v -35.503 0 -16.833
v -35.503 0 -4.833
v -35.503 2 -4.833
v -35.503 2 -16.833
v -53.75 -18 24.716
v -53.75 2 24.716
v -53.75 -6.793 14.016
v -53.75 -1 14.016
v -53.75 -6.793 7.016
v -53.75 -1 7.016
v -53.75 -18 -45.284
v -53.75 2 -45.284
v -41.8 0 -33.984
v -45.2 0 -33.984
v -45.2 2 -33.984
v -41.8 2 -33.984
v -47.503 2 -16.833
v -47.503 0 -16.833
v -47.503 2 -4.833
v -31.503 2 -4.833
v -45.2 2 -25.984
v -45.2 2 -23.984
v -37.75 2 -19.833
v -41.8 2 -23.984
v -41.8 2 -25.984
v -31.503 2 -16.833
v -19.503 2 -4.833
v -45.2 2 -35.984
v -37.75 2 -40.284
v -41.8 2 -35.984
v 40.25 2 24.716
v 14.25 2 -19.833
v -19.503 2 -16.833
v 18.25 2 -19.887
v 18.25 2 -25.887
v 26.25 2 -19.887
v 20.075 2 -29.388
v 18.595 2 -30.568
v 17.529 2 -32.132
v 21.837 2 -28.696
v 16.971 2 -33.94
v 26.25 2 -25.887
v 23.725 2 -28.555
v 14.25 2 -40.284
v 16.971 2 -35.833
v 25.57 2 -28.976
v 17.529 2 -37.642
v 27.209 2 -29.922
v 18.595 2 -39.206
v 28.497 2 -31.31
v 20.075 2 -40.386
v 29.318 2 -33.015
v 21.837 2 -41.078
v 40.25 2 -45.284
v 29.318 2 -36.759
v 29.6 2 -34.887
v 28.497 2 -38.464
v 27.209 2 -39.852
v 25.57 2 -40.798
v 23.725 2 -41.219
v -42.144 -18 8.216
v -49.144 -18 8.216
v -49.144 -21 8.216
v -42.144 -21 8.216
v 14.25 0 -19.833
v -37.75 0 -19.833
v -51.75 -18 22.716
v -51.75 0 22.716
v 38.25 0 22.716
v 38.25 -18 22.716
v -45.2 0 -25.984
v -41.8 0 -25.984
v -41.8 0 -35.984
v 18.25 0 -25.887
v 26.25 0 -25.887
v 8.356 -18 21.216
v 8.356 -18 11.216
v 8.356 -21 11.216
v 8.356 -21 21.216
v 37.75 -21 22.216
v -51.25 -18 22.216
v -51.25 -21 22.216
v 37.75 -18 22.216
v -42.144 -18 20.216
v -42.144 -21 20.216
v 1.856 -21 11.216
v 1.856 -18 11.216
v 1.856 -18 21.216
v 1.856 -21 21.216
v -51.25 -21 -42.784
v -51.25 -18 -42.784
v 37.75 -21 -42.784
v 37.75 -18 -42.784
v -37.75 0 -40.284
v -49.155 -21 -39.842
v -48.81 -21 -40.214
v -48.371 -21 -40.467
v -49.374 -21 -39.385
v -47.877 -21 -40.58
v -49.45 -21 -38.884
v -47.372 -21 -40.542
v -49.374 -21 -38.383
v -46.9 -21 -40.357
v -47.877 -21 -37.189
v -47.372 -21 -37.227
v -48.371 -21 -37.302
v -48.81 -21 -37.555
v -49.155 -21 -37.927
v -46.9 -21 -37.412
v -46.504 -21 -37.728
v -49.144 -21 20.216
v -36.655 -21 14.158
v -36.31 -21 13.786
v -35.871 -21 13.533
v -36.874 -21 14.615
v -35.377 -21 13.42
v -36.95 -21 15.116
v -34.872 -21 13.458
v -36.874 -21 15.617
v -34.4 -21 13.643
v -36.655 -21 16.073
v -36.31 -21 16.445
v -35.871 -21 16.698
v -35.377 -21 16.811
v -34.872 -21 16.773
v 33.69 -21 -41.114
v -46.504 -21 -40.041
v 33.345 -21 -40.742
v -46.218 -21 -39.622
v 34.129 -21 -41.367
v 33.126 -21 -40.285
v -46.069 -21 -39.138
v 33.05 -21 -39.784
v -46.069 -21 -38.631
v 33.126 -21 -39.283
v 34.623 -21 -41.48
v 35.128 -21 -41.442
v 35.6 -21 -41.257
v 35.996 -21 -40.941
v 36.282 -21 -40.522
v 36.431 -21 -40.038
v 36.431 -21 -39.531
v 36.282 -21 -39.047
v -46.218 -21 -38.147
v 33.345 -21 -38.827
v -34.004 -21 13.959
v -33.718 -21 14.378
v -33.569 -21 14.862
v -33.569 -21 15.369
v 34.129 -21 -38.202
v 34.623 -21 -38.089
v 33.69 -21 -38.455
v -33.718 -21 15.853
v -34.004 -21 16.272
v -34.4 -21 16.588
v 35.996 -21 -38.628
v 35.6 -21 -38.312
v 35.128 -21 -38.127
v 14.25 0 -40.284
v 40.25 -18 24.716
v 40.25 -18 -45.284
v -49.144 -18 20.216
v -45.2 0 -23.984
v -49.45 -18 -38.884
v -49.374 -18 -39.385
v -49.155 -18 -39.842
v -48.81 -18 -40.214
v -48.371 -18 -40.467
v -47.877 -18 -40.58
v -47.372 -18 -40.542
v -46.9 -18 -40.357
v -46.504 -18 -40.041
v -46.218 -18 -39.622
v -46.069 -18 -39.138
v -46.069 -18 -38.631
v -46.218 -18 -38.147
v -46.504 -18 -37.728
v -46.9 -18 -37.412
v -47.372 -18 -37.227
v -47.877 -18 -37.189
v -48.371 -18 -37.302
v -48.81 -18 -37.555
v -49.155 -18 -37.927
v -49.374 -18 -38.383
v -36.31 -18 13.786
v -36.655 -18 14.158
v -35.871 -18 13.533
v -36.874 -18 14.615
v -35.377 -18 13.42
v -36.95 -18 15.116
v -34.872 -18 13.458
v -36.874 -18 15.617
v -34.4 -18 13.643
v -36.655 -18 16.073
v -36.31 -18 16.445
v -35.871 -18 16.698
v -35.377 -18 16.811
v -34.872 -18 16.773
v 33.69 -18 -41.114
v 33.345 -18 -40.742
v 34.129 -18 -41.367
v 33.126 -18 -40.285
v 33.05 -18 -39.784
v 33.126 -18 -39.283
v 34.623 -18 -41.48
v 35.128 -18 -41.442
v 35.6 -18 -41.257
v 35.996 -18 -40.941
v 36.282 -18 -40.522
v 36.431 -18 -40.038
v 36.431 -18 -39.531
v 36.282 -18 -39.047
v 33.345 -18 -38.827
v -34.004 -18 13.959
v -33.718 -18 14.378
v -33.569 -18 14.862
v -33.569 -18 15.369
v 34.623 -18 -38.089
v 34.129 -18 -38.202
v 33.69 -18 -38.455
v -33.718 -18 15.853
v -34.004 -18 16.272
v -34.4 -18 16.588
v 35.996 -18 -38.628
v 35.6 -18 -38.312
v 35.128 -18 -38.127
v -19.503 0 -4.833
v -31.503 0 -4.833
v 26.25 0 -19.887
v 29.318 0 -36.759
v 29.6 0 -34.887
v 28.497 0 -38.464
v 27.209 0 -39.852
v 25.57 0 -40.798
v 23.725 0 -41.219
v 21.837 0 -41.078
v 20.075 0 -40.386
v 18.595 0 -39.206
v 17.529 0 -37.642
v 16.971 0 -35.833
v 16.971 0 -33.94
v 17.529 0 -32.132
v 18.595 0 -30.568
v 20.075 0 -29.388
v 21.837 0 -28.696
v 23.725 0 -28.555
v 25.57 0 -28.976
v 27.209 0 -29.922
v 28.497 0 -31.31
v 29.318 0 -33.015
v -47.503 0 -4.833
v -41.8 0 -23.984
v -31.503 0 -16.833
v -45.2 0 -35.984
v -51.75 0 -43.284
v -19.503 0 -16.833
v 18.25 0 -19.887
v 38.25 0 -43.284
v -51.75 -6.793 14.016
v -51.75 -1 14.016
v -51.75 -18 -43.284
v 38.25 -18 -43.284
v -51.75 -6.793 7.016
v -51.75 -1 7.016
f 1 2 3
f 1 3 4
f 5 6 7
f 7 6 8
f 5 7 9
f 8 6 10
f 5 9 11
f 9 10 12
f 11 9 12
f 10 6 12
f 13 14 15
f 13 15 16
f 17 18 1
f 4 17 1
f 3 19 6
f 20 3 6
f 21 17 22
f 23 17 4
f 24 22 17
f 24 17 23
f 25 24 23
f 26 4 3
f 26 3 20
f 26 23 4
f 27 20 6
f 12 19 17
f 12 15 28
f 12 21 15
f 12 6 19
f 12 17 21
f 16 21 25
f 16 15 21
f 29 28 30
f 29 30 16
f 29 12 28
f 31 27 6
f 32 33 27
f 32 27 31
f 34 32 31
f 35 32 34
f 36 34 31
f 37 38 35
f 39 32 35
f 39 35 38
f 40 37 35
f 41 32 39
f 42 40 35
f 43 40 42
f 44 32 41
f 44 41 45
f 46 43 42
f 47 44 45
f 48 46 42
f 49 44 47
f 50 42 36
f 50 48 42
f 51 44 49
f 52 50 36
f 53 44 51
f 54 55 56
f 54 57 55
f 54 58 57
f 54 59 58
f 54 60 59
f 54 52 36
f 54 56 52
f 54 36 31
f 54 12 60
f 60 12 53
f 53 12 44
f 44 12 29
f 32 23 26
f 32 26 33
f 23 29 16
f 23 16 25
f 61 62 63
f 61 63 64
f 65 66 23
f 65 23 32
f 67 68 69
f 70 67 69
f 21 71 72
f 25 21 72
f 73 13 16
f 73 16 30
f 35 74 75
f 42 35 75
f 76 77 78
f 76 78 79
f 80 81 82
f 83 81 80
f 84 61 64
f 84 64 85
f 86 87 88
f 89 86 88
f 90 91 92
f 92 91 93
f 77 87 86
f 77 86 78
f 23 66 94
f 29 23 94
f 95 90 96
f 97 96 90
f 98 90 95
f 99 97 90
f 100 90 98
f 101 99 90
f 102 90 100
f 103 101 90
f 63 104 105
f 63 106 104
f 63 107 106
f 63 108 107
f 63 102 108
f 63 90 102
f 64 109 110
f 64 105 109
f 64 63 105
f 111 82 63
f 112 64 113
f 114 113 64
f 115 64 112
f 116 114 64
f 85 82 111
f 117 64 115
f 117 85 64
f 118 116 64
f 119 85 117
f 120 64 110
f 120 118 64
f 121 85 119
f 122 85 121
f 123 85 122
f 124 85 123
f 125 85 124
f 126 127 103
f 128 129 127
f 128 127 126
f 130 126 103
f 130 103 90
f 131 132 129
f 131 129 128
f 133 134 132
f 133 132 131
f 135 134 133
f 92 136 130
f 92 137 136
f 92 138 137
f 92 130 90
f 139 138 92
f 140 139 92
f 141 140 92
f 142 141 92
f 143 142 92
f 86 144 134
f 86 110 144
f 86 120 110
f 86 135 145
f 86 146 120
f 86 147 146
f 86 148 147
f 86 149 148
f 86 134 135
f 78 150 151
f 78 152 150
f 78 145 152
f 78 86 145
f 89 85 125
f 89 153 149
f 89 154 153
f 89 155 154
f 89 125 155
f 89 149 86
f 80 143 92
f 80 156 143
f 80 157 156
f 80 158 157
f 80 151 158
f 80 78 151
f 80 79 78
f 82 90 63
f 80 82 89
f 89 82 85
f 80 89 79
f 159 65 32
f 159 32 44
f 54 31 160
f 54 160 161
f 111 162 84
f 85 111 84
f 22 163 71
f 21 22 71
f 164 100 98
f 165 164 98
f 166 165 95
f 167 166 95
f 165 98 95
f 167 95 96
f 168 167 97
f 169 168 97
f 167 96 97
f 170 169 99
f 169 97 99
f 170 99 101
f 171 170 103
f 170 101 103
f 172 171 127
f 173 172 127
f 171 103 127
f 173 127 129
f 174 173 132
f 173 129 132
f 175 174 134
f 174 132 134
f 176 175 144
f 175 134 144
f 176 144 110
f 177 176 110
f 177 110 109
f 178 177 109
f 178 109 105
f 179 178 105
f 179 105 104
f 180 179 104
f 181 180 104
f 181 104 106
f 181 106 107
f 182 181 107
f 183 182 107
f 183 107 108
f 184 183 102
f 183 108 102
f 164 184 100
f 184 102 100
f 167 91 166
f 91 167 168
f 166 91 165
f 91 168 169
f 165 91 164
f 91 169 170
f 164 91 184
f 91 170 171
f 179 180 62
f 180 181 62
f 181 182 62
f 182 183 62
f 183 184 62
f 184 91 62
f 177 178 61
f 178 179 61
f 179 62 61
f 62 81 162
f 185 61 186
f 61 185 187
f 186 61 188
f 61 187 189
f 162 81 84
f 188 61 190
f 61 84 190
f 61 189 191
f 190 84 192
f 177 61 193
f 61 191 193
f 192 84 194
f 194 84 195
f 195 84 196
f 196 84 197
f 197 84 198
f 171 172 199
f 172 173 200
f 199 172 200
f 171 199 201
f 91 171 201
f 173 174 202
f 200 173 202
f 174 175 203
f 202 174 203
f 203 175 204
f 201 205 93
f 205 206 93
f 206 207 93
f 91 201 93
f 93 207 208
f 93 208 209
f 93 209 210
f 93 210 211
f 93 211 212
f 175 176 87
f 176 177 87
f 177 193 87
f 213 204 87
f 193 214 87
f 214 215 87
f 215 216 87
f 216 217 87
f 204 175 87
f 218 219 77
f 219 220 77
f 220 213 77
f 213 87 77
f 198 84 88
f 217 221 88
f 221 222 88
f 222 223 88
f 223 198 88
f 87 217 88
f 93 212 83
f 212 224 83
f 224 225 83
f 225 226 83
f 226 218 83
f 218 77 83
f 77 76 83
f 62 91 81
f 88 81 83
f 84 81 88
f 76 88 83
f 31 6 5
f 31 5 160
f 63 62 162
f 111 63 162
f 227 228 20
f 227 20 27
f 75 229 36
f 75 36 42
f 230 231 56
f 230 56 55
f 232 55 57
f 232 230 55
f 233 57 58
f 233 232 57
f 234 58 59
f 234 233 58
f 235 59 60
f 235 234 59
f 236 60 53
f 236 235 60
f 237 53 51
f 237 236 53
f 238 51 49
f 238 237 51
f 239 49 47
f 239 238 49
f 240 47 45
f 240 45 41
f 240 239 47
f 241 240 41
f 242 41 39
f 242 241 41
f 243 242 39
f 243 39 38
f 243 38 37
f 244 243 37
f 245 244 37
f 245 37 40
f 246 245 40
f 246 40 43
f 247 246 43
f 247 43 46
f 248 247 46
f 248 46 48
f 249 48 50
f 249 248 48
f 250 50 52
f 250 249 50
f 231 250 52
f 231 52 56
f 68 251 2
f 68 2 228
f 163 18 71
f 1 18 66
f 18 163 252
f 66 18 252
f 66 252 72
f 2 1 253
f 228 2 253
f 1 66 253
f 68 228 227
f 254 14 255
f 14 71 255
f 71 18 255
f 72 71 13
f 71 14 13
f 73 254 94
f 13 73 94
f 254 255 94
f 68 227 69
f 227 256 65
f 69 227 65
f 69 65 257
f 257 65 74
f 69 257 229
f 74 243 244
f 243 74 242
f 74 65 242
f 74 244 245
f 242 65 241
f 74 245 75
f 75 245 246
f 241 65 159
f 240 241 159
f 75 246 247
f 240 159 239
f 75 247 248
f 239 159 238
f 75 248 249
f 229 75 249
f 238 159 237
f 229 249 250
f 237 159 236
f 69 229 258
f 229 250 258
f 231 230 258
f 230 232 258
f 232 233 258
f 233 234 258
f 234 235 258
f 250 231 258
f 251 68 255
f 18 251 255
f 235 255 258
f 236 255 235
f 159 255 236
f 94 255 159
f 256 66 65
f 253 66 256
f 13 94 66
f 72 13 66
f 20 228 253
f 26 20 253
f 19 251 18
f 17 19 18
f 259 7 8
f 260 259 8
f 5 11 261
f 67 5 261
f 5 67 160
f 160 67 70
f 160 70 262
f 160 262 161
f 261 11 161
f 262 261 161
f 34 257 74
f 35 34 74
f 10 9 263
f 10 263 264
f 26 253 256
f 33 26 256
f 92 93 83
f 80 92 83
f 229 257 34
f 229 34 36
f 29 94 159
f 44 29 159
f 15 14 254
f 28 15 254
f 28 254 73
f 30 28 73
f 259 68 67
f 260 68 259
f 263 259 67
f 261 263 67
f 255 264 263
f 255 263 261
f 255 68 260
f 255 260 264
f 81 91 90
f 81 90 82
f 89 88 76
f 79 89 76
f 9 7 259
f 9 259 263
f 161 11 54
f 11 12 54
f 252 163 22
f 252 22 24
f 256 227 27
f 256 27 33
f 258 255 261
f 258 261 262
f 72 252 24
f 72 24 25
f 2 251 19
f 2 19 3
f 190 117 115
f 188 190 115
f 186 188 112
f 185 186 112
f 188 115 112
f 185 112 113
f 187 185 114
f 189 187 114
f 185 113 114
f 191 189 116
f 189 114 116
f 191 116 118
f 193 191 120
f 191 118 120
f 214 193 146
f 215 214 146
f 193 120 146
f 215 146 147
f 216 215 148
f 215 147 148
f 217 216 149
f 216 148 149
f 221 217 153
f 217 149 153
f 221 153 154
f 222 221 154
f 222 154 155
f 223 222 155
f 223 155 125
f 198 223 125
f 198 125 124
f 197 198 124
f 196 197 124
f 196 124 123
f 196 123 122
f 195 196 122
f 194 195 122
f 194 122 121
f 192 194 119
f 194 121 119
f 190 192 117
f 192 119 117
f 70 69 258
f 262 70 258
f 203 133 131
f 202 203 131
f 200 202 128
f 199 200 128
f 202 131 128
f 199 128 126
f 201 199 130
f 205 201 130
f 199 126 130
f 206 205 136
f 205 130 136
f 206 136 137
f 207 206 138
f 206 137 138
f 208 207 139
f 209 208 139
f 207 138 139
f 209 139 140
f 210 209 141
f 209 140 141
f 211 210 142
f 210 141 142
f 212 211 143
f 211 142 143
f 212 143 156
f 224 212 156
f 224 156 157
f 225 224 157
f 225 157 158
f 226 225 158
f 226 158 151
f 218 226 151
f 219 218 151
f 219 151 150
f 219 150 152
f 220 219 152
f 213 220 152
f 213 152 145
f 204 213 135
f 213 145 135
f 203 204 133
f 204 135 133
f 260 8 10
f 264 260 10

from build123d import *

# Parameters (mm, degrees)
SKETCH1_W                = 94
SKETCH1_H                = 70
SKETCH1_R                = 6.35
SKETCH1_W_2              = 8
SKETCH1_H_2              = 6
SKETCH1_W_3              = 3.4
SKETCH1_H_3              = 2
SKETCH1_W_4              = 52
SKETCH1_H_4              = 20.451642238
SKETCH1_W_5              = 12
SKETCH1_H_5              = 12
BOSS_EXTRUDE1_DEPTH      = 2
SKETCH2_W                = 94
SKETCH2_H                = 70
SKETCH2_W_2              = 90
SKETCH2_H_2              = 66
BOSS_EXTRUDE2_DEPTH      = 1
BOSS_EXTRUDE2_DEPTH_BACK = 18
CUT_EXTRUDE1_START       = -94
SKETCH3_W                = 7
SKETCH3_H                = 5.793277682
CUT_EXTRUDE1_DEPTH       = 10
CUT_EXTRUDE1_DEPTH_BACK  = 10
SKETCH4_W                = 89
SKETCH4_H                = 65
SKETCH4_W_2              = 7
SKETCH4_H_2              = 12
SKETCH4_W_3              = 6.5
SKETCH4_H_3              = 10
BOSS_EXTRUDE3_DEPTH      = 3
SKETCH5_R                = 1.7
CUT_EXTRUDE5_DEPTH       = 3


with BuildPart() as part:
    # Sketch1 → Boss-Extrude1 (new body)
    with BuildSketch(Plane(origin=(0, 0, 0), x_dir=(1, 0, 0), z_dir=(0, 1, 0))):
        with Locations((-6.75, 10.284411869)):
            Rectangle(SKETCH1_W, SKETCH1_H)
        with Locations((23.25, 34.886908177)):
            Circle(SKETCH1_R, mode=Mode.SUBTRACT)
        with Locations((22.25, 22.886908177)):
            Rectangle(SKETCH1_W_2, SKETCH1_H_2, mode=Mode.SUBTRACT)
        with Locations((-43.5, 24.984411869)):
            Rectangle(SKETCH1_W_3, SKETCH1_H_3, mode=Mode.SUBTRACT)
        with Locations((-11.75, 30.05859075)):
            Rectangle(SKETCH1_W_4, SKETCH1_H_4, mode=Mode.SUBTRACT)
        with Locations((-41.502745427, 10.832769631)):
            Rectangle(SKETCH1_W_5, SKETCH1_H_5, mode=Mode.SUBTRACT)
        with Locations((-25.502745427, 10.832769631)):
            Rectangle(SKETCH1_W_5, SKETCH1_H_5, mode=Mode.SUBTRACT)
        with Locations((-43.5, 34.984411869)):
            Rectangle(SKETCH1_W_3, SKETCH1_H_3, mode=Mode.SUBTRACT)
    extrude(amount=BOSS_EXTRUDE1_DEPTH)

    # Sketch2 → Boss-Extrude2 (add, two sides)
    with BuildSketch(Plane(origin=(0, 0, 0), x_dir=(1, 0, 0), z_dir=(0, 1, 0))) as boss_extrude2_sk:
        with Locations((-6.75, 10.284411869)):
            Rectangle(SKETCH2_W, SKETCH2_H)
        with Locations((-6.75, 10.284411869)):
            Rectangle(SKETCH2_W_2, SKETCH2_H_2, mode=Mode.SUBTRACT)
    extrude(amount=BOSS_EXTRUDE2_DEPTH)
    extrude(boss_extrude2_sk.sketch, amount=-BOSS_EXTRUDE2_DEPTH_BACK)

    # Sketch3 → Cut-Extrude1 (cut, two sides)
    with BuildSketch(Plane(origin=(40.25, 0, 0), x_dir=(0, 0, -1), z_dir=(1, 0, 0)).offset(CUT_EXTRUDE1_START)) as cut_extrude1_sk:
        with Locations((-10.515588131, -3.896638841)):
            Rectangle(SKETCH3_W, SKETCH3_H)
    extrude(amount=CUT_EXTRUDE1_DEPTH, mode=Mode.SUBTRACT)
    extrude(cut_extrude1_sk.sketch, amount=-CUT_EXTRUDE1_DEPTH_BACK, mode=Mode.SUBTRACT)


with BuildPart() as body_2:
    # Sketch4 → Boss-Extrude3 (new body)
    with BuildSketch(Plane.XZ.offset(18)):
        with Locations((-6.75, -10.284411869)):
            Rectangle(SKETCH4_W, SKETCH4_H)
        with Locations((-45.644363442, 14.215588131)):
            Rectangle(SKETCH4_W_2, SKETCH4_H_2, mode=Mode.SUBTRACT)
        with Locations((5.105636558, 16.215588131)):
            Rectangle(SKETCH4_W_3, SKETCH4_H_3, mode=Mode.SUBTRACT)
    extrude(amount=BOSS_EXTRUDE3_DEPTH)

    # Sketch5 → Cut-Extrude5 (cut)
    with BuildSketch(Plane(origin=(0, -21, 0), x_dir=(-1, 0, 0), z_dir=(0, -1, 0))):
        with Locations((-34.75, 39.784411869)):
            Circle(SKETCH5_R)
        with Locations((35.25, -15.115588131)):
            Circle(SKETCH5_R)
        with Locations((47.75, 38.884411869)):
            Circle(SKETCH5_R)
    extrude(amount=-CUT_EXTRUDE5_DEPTH, mode=Mode.SUBTRACT)


solid = Compound([part.part, body_2.part])
